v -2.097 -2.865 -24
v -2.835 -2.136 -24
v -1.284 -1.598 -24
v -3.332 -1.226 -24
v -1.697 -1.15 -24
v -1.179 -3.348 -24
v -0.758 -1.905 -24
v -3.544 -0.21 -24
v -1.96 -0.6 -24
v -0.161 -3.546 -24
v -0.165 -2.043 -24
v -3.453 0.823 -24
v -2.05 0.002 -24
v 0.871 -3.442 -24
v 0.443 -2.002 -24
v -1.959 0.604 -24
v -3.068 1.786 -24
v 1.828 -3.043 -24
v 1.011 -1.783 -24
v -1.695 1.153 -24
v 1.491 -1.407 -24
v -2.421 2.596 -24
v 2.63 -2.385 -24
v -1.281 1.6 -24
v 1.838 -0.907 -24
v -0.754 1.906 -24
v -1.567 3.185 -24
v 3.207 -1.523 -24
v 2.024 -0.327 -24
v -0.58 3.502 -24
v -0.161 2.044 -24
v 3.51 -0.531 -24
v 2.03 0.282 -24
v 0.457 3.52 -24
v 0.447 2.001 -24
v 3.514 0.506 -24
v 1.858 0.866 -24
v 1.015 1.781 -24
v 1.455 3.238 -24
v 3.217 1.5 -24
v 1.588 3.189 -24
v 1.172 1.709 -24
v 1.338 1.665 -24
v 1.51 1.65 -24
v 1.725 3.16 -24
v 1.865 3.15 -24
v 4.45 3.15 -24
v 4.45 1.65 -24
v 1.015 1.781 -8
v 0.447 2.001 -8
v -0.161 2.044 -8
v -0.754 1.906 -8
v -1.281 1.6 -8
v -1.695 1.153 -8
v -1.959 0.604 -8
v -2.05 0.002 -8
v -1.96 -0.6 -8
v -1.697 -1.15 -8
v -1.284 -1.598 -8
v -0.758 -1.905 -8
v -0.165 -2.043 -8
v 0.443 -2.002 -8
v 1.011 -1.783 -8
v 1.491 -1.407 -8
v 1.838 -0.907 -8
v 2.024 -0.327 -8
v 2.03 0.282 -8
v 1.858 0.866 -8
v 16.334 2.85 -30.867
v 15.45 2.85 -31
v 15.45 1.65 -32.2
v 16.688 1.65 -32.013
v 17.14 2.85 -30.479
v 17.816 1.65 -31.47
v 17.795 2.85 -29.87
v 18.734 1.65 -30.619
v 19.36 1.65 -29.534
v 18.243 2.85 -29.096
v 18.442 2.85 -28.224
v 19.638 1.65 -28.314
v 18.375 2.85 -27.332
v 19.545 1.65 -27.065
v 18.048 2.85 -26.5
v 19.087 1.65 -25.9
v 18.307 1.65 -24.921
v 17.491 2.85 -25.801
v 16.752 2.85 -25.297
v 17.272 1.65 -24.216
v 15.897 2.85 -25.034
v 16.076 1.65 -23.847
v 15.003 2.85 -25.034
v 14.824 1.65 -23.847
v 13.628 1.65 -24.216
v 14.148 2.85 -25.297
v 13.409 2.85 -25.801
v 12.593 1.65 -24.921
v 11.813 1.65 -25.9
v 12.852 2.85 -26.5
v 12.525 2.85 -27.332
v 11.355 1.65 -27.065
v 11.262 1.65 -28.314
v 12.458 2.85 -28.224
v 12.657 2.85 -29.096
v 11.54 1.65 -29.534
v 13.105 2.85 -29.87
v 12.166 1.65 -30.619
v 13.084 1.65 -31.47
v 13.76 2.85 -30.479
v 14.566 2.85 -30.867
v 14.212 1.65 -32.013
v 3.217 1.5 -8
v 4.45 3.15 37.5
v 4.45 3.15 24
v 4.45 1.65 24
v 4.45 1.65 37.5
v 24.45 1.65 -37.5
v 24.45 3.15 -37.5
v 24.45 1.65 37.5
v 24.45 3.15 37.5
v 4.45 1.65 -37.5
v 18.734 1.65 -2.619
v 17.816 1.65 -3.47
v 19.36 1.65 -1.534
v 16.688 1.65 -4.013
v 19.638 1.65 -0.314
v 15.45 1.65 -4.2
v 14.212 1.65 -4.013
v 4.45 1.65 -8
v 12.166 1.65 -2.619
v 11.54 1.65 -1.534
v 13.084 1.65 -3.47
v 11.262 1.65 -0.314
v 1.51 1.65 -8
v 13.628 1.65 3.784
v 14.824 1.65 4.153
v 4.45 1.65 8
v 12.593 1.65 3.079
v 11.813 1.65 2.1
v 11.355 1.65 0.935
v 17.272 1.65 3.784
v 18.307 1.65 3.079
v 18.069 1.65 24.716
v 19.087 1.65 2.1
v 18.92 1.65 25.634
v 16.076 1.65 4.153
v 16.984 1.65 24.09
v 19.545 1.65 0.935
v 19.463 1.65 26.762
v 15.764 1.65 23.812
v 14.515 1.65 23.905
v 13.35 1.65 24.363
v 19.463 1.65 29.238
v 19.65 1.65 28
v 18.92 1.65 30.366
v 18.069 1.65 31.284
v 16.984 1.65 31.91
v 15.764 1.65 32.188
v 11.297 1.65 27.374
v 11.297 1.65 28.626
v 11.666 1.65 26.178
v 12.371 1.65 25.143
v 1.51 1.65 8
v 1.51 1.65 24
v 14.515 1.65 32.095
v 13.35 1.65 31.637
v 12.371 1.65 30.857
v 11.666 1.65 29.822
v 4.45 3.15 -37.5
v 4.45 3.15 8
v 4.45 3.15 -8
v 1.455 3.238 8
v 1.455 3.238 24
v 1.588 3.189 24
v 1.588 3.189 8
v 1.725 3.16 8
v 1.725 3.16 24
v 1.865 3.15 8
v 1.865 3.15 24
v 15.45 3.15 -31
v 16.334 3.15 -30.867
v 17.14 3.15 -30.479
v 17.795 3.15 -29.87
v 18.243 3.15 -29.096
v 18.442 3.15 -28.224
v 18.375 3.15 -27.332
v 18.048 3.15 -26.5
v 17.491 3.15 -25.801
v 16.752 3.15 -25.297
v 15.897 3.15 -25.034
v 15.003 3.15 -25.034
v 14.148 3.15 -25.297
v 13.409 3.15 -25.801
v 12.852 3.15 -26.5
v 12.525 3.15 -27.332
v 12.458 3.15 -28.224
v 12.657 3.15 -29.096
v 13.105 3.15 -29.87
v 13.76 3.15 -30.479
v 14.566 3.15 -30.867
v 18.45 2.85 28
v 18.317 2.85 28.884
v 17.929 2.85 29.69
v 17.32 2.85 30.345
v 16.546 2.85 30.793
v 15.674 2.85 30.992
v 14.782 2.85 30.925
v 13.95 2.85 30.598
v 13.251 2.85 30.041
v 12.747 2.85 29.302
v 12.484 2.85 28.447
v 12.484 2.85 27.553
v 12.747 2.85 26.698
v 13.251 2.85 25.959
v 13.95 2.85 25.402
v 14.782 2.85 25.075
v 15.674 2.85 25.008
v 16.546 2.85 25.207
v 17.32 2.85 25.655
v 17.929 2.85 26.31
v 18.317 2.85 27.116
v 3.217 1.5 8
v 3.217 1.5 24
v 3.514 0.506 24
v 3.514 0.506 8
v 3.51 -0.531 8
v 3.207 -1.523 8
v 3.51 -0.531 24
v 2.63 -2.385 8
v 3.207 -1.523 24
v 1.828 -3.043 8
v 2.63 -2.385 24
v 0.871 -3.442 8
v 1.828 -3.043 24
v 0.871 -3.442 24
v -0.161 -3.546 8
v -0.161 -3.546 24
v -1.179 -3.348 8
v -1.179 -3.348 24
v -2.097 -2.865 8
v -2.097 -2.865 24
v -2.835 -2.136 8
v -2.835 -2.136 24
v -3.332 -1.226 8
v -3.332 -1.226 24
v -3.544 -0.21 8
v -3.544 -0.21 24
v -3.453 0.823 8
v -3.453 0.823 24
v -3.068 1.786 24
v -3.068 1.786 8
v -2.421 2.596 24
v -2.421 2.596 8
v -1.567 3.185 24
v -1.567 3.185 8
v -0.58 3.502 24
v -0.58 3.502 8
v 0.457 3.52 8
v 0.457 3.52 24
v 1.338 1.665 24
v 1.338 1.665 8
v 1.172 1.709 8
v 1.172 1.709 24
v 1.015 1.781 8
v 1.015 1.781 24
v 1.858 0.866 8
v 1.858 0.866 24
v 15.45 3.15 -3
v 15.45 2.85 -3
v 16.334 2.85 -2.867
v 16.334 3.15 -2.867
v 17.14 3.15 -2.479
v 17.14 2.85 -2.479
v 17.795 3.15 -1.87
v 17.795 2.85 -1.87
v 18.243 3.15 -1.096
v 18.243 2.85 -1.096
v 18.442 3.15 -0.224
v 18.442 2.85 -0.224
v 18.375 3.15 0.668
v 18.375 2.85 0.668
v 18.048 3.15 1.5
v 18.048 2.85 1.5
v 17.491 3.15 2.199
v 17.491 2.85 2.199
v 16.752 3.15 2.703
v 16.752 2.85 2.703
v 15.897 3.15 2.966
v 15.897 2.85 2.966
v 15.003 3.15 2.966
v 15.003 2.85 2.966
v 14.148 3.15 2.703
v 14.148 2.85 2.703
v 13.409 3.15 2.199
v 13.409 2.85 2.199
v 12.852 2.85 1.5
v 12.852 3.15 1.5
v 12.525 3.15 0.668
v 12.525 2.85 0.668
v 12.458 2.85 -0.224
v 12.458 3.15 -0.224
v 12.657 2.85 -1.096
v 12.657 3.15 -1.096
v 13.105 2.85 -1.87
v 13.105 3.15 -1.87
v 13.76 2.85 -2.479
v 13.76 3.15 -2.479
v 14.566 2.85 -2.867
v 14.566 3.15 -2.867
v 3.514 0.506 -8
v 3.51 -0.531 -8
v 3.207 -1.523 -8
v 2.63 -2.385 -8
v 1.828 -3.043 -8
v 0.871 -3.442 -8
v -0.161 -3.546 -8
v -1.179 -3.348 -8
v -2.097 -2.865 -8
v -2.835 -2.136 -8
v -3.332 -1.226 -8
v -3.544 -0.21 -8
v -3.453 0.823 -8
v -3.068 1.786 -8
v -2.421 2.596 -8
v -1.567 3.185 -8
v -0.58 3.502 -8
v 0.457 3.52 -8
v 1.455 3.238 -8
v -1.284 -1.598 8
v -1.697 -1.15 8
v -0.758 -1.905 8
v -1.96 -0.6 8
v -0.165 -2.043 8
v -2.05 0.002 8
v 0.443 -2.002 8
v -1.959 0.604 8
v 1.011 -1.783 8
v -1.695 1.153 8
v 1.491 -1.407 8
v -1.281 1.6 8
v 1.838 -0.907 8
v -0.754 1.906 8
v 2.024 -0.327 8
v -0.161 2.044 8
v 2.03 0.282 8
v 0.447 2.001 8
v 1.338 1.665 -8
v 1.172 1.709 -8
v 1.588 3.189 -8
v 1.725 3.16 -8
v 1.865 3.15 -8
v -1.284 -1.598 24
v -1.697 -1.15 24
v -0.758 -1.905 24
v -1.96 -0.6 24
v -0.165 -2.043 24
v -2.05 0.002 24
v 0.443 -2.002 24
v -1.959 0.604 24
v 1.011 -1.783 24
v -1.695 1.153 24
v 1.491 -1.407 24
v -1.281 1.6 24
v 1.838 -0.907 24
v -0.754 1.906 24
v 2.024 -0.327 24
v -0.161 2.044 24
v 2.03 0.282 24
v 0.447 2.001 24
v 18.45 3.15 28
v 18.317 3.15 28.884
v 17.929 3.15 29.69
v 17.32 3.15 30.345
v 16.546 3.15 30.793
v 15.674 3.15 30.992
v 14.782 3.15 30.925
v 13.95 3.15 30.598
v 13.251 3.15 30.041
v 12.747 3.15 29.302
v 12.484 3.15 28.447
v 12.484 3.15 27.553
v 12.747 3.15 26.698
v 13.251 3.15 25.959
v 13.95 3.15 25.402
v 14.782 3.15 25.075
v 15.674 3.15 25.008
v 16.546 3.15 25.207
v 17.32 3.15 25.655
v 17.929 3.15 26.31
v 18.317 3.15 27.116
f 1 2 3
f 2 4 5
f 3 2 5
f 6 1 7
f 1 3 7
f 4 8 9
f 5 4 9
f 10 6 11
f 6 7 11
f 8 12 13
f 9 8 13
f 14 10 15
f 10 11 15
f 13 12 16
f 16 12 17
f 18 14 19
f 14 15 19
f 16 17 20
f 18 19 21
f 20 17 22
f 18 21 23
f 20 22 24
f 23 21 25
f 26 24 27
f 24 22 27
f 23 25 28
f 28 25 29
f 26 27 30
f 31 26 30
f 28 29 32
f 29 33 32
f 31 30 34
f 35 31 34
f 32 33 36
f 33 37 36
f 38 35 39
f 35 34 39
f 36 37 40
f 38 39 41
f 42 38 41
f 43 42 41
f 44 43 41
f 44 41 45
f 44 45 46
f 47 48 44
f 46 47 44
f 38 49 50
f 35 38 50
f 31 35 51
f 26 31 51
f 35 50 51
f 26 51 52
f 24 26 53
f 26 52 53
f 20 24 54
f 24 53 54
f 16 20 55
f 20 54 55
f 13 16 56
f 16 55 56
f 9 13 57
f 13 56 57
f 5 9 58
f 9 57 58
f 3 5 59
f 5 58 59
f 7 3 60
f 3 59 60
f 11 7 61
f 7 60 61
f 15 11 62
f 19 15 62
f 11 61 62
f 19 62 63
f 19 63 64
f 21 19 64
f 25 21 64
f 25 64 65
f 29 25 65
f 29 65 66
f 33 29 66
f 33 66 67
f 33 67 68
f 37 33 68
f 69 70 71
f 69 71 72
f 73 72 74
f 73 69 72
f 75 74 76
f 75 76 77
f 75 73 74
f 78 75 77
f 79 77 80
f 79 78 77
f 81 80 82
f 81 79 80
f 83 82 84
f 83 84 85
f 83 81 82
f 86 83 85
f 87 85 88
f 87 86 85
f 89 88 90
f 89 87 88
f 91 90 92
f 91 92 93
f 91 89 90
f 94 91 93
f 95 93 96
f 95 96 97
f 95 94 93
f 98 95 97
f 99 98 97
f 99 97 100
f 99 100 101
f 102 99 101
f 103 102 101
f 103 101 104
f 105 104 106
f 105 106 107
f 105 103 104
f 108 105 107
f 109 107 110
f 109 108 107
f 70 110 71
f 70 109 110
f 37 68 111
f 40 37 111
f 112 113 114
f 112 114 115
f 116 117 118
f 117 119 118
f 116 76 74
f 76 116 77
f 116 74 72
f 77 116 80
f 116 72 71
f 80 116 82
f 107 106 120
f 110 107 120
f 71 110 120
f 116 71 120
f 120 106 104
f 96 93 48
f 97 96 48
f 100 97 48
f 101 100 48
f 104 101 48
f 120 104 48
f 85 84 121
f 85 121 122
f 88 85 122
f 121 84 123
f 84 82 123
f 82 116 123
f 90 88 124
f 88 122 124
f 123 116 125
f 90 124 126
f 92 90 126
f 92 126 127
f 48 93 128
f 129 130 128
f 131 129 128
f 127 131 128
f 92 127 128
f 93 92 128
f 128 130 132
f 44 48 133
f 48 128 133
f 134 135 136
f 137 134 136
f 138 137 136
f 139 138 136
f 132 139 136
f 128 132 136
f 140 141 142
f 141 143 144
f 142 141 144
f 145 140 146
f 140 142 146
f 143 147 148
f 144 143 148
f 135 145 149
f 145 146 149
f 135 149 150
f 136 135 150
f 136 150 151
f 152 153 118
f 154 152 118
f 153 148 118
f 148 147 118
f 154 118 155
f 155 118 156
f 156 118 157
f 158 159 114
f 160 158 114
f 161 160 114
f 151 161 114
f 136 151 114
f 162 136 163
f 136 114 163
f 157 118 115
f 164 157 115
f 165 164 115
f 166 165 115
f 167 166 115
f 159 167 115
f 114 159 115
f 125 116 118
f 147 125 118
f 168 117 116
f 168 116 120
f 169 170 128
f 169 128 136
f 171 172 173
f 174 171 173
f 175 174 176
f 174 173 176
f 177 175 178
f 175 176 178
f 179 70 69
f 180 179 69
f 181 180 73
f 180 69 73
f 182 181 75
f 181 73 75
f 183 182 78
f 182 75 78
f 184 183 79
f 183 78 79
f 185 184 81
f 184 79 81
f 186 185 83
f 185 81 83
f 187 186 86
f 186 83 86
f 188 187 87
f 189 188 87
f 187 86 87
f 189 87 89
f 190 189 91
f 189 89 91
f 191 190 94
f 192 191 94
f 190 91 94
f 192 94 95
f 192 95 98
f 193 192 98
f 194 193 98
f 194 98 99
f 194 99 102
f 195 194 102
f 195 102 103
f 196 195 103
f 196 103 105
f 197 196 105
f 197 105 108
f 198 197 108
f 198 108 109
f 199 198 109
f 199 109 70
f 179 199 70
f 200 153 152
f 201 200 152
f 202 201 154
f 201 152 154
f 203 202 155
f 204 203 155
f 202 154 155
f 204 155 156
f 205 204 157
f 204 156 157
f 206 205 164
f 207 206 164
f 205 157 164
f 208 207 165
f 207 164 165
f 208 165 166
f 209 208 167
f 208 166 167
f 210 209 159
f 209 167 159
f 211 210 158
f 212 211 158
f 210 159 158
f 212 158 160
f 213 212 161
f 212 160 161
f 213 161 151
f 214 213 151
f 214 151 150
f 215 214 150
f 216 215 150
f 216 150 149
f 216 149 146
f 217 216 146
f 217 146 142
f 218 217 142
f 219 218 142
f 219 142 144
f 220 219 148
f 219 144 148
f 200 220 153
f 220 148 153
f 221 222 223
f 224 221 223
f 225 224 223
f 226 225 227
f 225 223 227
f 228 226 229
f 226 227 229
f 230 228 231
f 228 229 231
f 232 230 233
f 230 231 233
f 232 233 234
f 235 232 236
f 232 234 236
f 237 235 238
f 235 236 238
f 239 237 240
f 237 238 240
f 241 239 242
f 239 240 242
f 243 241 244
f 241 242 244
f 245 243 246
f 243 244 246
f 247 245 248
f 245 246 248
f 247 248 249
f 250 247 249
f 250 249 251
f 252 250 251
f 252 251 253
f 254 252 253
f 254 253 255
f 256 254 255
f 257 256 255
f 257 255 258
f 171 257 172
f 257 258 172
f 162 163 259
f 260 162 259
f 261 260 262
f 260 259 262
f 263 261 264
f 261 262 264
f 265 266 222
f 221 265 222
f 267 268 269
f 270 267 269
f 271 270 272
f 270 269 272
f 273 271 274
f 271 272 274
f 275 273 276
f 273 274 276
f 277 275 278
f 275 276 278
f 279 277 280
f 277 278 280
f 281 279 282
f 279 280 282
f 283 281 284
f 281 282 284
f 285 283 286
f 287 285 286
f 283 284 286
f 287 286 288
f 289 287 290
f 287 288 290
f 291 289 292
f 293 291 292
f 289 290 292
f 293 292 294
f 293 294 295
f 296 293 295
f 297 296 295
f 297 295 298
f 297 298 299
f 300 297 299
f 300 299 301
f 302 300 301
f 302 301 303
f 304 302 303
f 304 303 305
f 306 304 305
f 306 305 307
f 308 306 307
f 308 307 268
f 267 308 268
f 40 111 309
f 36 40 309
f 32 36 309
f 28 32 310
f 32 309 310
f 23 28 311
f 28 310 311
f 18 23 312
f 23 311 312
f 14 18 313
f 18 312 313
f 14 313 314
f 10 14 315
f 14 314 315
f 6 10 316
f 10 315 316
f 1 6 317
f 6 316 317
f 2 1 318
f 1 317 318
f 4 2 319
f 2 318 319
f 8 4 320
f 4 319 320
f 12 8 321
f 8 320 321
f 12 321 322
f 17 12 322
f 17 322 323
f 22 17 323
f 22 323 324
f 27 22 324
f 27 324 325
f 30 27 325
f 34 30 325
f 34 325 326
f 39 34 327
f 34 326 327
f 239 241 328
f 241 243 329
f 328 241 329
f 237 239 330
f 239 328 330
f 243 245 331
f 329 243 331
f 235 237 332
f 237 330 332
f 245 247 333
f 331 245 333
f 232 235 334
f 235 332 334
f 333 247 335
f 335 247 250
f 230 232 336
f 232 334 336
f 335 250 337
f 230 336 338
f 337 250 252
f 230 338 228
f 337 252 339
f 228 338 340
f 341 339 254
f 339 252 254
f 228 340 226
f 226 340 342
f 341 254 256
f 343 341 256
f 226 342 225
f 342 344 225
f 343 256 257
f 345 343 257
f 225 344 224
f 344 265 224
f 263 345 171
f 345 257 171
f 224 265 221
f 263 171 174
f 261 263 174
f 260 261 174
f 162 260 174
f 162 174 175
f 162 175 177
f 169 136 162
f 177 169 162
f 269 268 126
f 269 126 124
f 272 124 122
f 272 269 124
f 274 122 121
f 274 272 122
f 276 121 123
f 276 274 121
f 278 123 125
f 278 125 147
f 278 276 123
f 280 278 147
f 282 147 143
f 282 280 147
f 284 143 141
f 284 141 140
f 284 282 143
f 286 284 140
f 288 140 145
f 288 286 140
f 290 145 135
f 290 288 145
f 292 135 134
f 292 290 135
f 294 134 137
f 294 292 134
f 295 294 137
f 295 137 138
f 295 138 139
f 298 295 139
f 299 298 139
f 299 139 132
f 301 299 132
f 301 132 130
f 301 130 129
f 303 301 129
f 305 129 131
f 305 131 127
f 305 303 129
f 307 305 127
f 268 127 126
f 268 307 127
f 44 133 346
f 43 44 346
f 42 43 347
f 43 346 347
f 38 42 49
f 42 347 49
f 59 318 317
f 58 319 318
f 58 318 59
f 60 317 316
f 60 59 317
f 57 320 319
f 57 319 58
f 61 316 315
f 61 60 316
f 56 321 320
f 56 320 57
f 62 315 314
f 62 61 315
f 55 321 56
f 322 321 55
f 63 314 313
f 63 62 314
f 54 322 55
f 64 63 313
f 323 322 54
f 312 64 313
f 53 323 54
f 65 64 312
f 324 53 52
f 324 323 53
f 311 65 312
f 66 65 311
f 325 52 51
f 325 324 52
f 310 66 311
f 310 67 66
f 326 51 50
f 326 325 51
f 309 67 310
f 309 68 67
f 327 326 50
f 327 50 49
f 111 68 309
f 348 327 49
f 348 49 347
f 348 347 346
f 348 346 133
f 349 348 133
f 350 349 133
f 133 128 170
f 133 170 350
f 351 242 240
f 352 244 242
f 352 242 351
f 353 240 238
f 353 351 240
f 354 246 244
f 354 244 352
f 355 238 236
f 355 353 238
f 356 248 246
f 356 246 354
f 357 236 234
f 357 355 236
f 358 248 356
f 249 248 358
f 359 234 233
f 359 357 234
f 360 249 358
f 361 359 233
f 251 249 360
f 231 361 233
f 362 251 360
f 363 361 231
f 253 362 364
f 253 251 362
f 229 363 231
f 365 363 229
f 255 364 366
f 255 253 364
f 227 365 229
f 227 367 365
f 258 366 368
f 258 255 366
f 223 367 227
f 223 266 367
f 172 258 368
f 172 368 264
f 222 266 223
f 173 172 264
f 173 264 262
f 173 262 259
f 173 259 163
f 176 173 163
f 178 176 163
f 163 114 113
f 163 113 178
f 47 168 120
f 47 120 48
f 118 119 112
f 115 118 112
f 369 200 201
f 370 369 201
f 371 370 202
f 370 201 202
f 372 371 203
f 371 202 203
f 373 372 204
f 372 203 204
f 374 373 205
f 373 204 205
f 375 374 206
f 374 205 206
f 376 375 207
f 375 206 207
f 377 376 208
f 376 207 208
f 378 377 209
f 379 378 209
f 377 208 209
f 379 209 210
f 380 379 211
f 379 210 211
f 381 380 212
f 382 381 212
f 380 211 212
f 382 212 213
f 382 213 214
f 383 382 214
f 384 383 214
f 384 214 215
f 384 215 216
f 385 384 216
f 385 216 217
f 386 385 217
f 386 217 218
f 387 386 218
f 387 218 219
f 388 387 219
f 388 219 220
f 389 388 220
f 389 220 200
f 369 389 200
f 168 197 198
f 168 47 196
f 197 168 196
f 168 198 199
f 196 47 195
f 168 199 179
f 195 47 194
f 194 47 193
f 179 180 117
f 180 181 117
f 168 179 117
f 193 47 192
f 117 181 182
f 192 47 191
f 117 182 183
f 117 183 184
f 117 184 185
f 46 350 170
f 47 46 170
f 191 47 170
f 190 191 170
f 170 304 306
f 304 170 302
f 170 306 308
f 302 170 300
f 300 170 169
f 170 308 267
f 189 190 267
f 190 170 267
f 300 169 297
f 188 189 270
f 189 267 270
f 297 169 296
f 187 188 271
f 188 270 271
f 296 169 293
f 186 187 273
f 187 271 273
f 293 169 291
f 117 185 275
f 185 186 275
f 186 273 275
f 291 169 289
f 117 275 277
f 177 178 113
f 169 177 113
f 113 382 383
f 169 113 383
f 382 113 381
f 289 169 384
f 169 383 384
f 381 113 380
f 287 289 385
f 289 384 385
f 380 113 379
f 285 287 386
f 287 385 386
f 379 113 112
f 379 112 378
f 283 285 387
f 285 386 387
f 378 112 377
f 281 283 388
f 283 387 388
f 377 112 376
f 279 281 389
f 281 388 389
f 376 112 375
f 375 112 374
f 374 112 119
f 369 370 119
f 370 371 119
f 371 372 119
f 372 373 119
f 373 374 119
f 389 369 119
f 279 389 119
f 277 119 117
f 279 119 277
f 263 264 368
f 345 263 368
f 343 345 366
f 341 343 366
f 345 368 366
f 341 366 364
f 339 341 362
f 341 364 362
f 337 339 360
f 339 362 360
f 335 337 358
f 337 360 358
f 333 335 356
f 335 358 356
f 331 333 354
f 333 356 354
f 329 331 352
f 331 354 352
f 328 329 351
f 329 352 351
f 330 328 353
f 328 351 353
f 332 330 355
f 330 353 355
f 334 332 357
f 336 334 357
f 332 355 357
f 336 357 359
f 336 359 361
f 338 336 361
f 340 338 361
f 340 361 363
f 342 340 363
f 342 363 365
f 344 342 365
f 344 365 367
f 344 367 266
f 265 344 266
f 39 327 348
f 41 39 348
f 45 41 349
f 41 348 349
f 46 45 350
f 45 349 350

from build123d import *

# Parameters (mm, degrees)
BOSS_EXTRUDE1_DEPTH     = 37.5
CUT_EXTRUDE1_DEPTH      = 46.067643604
CUT_EXTRUDE1_DEPTH_BACK = 46.067643604
SKETCH2_W               = 8
SKETCH2_H               = 16
CUT_EXTRUDE2_DEPTH      = 46.067643604
CUT_EXTRUDE2_DEPTH_BACK = 46.067643604
SKETCH3_W               = 8
SKETCH3_H               = 13.5
SKETCH4_R               = 3
CUT_EXTRUDE3_DEPTH      = 46.067643604
LPATTERN1_COUNT         = 2
LPATTERN1_PITCH         = 28
MIRROR1_COPY_1_SKETCH_R = 3
MIRROR1_COPY_1_DEPTH    = 46.067643604
MIRROR1_COPY_2_SKETCH_R = 3
MIRROR1_COPY_2_DEPTH    = 46.067643604
CHAMFER1_SIZE           = 1.2


with BuildPart() as part:
    # Sketch1 → Boss-Extrude1 (new, symmetric)
    with BuildSketch(Plane.XY):
        with BuildLine():
            Line((1.865475811, 3.15), (24.45, 3.15))
            Line((24.45, 3.15), (24.45, 1.65))
            Line((24.45, 1.65), (1.509966887, 1.65))
            ThreePointArc((1.509966887, 1.65), (1.253893127, 1.683342755), (1.014895777, 1.781147541))
            ThreePointArc((1.014895777, 1.781147541), (-1.507477704, -1.389248347), (1.857930963, 0.866367437))
            Line((1.857930963, 0.866367437), (3.217392644, 1.500294829))
            ThreePointArc((3.217392644, 1.500294829), (-2.492742617, -2.527594557), (1.455481127, 3.237912088))
            ThreePointArc((1.455481127, 3.237912088), (1.655818843, 3.172224997), (1.865475811, 3.15))
        make_face()
    extrude(amount=BOSS_EXTRUDE1_DEPTH, both=True)

    # Sketch2 → Cut-Extrude1 (cut, two sides: drawn at the far end of the back side and taken through both)
    with BuildSketch(Plane.XZ.offset(-1.65).offset(-CUT_EXTRUDE1_DEPTH_BACK)):
        with Locations((0.45, 0)):
            Rectangle(SKETCH2_W, SKETCH2_H)
    extrude(amount=CUT_EXTRUDE1_DEPTH + CUT_EXTRUDE1_DEPTH_BACK, mode=Mode.SUBTRACT)

    # Sketch3 → Cut-Extrude2 (cut, two sides: drawn at the far end of the back side and taken through both)
    with BuildSketch(Plane.XZ.offset(-1.65).offset(-CUT_EXTRUDE2_DEPTH_BACK)):
        with Locations((0.45, 30.75)):
            Rectangle(SKETCH3_W, SKETCH3_H)
        with Locations((0.45, -30.75)):
            Rectangle(SKETCH3_W, SKETCH3_H)
    extrude(amount=CUT_EXTRUDE2_DEPTH + CUT_EXTRUDE2_DEPTH_BACK, mode=Mode.SUBTRACT)

    # Sketch4 → Cut-Extrude3 (cut, through all)
    with BuildSketch(Plane.XZ.offset(-1.65)):
        with Locations(Location((15.45, 0, 0), (0, 0, 270))):
            Circle(SKETCH4_R)
    cut_extrude3 = extrude(amount=-CUT_EXTRUDE3_DEPTH, mode=Mode.SUBTRACT)

    # LPattern1: Cut-Extrude3 ×2
    with Locations(*[(0, 0, -i * LPATTERN1_PITCH) for i in range(1, LPATTERN1_COUNT)]):
        add(cut_extrude3, mode=Mode.SUBTRACT)

    # Mirror1 copy 1 sketch → Mirror1 copy 1 (cut, through all)
    with BuildSketch(Plane(origin=(0, 1.65, 28), x_dir=(1, 0, 0), z_dir=(0, -1, 0))):
        with Locations((15.45, 0)):
            Circle(MIRROR1_COPY_1_SKETCH_R)
    extrude(amount=-MIRROR1_COPY_1_DEPTH, mode=Mode.SUBTRACT)

    # Mirror1 copy 2 sketch → Mirror1 copy 2 (cut, through all)
    with BuildSketch(Plane.XZ.offset(-1.65)):
        with Locations((15.45, 0)):
            Circle(MIRROR1_COPY_2_SKETCH_R)
    extrude(amount=-MIRROR1_COPY_2_DEPTH, mode=Mode.SUBTRACT)

    # Chamfer1
    chamfer1_edges = [part.edges().sort_by_distance(p)[0] for p in [
        (15.45, 1.65, 3),
        (15.45, 1.65, -25),
        (12.45, 1.65, 28),
    ]]
    chamfer(chamfer1_edges, length=CHAMFER1_SIZE)


solid = part.part
